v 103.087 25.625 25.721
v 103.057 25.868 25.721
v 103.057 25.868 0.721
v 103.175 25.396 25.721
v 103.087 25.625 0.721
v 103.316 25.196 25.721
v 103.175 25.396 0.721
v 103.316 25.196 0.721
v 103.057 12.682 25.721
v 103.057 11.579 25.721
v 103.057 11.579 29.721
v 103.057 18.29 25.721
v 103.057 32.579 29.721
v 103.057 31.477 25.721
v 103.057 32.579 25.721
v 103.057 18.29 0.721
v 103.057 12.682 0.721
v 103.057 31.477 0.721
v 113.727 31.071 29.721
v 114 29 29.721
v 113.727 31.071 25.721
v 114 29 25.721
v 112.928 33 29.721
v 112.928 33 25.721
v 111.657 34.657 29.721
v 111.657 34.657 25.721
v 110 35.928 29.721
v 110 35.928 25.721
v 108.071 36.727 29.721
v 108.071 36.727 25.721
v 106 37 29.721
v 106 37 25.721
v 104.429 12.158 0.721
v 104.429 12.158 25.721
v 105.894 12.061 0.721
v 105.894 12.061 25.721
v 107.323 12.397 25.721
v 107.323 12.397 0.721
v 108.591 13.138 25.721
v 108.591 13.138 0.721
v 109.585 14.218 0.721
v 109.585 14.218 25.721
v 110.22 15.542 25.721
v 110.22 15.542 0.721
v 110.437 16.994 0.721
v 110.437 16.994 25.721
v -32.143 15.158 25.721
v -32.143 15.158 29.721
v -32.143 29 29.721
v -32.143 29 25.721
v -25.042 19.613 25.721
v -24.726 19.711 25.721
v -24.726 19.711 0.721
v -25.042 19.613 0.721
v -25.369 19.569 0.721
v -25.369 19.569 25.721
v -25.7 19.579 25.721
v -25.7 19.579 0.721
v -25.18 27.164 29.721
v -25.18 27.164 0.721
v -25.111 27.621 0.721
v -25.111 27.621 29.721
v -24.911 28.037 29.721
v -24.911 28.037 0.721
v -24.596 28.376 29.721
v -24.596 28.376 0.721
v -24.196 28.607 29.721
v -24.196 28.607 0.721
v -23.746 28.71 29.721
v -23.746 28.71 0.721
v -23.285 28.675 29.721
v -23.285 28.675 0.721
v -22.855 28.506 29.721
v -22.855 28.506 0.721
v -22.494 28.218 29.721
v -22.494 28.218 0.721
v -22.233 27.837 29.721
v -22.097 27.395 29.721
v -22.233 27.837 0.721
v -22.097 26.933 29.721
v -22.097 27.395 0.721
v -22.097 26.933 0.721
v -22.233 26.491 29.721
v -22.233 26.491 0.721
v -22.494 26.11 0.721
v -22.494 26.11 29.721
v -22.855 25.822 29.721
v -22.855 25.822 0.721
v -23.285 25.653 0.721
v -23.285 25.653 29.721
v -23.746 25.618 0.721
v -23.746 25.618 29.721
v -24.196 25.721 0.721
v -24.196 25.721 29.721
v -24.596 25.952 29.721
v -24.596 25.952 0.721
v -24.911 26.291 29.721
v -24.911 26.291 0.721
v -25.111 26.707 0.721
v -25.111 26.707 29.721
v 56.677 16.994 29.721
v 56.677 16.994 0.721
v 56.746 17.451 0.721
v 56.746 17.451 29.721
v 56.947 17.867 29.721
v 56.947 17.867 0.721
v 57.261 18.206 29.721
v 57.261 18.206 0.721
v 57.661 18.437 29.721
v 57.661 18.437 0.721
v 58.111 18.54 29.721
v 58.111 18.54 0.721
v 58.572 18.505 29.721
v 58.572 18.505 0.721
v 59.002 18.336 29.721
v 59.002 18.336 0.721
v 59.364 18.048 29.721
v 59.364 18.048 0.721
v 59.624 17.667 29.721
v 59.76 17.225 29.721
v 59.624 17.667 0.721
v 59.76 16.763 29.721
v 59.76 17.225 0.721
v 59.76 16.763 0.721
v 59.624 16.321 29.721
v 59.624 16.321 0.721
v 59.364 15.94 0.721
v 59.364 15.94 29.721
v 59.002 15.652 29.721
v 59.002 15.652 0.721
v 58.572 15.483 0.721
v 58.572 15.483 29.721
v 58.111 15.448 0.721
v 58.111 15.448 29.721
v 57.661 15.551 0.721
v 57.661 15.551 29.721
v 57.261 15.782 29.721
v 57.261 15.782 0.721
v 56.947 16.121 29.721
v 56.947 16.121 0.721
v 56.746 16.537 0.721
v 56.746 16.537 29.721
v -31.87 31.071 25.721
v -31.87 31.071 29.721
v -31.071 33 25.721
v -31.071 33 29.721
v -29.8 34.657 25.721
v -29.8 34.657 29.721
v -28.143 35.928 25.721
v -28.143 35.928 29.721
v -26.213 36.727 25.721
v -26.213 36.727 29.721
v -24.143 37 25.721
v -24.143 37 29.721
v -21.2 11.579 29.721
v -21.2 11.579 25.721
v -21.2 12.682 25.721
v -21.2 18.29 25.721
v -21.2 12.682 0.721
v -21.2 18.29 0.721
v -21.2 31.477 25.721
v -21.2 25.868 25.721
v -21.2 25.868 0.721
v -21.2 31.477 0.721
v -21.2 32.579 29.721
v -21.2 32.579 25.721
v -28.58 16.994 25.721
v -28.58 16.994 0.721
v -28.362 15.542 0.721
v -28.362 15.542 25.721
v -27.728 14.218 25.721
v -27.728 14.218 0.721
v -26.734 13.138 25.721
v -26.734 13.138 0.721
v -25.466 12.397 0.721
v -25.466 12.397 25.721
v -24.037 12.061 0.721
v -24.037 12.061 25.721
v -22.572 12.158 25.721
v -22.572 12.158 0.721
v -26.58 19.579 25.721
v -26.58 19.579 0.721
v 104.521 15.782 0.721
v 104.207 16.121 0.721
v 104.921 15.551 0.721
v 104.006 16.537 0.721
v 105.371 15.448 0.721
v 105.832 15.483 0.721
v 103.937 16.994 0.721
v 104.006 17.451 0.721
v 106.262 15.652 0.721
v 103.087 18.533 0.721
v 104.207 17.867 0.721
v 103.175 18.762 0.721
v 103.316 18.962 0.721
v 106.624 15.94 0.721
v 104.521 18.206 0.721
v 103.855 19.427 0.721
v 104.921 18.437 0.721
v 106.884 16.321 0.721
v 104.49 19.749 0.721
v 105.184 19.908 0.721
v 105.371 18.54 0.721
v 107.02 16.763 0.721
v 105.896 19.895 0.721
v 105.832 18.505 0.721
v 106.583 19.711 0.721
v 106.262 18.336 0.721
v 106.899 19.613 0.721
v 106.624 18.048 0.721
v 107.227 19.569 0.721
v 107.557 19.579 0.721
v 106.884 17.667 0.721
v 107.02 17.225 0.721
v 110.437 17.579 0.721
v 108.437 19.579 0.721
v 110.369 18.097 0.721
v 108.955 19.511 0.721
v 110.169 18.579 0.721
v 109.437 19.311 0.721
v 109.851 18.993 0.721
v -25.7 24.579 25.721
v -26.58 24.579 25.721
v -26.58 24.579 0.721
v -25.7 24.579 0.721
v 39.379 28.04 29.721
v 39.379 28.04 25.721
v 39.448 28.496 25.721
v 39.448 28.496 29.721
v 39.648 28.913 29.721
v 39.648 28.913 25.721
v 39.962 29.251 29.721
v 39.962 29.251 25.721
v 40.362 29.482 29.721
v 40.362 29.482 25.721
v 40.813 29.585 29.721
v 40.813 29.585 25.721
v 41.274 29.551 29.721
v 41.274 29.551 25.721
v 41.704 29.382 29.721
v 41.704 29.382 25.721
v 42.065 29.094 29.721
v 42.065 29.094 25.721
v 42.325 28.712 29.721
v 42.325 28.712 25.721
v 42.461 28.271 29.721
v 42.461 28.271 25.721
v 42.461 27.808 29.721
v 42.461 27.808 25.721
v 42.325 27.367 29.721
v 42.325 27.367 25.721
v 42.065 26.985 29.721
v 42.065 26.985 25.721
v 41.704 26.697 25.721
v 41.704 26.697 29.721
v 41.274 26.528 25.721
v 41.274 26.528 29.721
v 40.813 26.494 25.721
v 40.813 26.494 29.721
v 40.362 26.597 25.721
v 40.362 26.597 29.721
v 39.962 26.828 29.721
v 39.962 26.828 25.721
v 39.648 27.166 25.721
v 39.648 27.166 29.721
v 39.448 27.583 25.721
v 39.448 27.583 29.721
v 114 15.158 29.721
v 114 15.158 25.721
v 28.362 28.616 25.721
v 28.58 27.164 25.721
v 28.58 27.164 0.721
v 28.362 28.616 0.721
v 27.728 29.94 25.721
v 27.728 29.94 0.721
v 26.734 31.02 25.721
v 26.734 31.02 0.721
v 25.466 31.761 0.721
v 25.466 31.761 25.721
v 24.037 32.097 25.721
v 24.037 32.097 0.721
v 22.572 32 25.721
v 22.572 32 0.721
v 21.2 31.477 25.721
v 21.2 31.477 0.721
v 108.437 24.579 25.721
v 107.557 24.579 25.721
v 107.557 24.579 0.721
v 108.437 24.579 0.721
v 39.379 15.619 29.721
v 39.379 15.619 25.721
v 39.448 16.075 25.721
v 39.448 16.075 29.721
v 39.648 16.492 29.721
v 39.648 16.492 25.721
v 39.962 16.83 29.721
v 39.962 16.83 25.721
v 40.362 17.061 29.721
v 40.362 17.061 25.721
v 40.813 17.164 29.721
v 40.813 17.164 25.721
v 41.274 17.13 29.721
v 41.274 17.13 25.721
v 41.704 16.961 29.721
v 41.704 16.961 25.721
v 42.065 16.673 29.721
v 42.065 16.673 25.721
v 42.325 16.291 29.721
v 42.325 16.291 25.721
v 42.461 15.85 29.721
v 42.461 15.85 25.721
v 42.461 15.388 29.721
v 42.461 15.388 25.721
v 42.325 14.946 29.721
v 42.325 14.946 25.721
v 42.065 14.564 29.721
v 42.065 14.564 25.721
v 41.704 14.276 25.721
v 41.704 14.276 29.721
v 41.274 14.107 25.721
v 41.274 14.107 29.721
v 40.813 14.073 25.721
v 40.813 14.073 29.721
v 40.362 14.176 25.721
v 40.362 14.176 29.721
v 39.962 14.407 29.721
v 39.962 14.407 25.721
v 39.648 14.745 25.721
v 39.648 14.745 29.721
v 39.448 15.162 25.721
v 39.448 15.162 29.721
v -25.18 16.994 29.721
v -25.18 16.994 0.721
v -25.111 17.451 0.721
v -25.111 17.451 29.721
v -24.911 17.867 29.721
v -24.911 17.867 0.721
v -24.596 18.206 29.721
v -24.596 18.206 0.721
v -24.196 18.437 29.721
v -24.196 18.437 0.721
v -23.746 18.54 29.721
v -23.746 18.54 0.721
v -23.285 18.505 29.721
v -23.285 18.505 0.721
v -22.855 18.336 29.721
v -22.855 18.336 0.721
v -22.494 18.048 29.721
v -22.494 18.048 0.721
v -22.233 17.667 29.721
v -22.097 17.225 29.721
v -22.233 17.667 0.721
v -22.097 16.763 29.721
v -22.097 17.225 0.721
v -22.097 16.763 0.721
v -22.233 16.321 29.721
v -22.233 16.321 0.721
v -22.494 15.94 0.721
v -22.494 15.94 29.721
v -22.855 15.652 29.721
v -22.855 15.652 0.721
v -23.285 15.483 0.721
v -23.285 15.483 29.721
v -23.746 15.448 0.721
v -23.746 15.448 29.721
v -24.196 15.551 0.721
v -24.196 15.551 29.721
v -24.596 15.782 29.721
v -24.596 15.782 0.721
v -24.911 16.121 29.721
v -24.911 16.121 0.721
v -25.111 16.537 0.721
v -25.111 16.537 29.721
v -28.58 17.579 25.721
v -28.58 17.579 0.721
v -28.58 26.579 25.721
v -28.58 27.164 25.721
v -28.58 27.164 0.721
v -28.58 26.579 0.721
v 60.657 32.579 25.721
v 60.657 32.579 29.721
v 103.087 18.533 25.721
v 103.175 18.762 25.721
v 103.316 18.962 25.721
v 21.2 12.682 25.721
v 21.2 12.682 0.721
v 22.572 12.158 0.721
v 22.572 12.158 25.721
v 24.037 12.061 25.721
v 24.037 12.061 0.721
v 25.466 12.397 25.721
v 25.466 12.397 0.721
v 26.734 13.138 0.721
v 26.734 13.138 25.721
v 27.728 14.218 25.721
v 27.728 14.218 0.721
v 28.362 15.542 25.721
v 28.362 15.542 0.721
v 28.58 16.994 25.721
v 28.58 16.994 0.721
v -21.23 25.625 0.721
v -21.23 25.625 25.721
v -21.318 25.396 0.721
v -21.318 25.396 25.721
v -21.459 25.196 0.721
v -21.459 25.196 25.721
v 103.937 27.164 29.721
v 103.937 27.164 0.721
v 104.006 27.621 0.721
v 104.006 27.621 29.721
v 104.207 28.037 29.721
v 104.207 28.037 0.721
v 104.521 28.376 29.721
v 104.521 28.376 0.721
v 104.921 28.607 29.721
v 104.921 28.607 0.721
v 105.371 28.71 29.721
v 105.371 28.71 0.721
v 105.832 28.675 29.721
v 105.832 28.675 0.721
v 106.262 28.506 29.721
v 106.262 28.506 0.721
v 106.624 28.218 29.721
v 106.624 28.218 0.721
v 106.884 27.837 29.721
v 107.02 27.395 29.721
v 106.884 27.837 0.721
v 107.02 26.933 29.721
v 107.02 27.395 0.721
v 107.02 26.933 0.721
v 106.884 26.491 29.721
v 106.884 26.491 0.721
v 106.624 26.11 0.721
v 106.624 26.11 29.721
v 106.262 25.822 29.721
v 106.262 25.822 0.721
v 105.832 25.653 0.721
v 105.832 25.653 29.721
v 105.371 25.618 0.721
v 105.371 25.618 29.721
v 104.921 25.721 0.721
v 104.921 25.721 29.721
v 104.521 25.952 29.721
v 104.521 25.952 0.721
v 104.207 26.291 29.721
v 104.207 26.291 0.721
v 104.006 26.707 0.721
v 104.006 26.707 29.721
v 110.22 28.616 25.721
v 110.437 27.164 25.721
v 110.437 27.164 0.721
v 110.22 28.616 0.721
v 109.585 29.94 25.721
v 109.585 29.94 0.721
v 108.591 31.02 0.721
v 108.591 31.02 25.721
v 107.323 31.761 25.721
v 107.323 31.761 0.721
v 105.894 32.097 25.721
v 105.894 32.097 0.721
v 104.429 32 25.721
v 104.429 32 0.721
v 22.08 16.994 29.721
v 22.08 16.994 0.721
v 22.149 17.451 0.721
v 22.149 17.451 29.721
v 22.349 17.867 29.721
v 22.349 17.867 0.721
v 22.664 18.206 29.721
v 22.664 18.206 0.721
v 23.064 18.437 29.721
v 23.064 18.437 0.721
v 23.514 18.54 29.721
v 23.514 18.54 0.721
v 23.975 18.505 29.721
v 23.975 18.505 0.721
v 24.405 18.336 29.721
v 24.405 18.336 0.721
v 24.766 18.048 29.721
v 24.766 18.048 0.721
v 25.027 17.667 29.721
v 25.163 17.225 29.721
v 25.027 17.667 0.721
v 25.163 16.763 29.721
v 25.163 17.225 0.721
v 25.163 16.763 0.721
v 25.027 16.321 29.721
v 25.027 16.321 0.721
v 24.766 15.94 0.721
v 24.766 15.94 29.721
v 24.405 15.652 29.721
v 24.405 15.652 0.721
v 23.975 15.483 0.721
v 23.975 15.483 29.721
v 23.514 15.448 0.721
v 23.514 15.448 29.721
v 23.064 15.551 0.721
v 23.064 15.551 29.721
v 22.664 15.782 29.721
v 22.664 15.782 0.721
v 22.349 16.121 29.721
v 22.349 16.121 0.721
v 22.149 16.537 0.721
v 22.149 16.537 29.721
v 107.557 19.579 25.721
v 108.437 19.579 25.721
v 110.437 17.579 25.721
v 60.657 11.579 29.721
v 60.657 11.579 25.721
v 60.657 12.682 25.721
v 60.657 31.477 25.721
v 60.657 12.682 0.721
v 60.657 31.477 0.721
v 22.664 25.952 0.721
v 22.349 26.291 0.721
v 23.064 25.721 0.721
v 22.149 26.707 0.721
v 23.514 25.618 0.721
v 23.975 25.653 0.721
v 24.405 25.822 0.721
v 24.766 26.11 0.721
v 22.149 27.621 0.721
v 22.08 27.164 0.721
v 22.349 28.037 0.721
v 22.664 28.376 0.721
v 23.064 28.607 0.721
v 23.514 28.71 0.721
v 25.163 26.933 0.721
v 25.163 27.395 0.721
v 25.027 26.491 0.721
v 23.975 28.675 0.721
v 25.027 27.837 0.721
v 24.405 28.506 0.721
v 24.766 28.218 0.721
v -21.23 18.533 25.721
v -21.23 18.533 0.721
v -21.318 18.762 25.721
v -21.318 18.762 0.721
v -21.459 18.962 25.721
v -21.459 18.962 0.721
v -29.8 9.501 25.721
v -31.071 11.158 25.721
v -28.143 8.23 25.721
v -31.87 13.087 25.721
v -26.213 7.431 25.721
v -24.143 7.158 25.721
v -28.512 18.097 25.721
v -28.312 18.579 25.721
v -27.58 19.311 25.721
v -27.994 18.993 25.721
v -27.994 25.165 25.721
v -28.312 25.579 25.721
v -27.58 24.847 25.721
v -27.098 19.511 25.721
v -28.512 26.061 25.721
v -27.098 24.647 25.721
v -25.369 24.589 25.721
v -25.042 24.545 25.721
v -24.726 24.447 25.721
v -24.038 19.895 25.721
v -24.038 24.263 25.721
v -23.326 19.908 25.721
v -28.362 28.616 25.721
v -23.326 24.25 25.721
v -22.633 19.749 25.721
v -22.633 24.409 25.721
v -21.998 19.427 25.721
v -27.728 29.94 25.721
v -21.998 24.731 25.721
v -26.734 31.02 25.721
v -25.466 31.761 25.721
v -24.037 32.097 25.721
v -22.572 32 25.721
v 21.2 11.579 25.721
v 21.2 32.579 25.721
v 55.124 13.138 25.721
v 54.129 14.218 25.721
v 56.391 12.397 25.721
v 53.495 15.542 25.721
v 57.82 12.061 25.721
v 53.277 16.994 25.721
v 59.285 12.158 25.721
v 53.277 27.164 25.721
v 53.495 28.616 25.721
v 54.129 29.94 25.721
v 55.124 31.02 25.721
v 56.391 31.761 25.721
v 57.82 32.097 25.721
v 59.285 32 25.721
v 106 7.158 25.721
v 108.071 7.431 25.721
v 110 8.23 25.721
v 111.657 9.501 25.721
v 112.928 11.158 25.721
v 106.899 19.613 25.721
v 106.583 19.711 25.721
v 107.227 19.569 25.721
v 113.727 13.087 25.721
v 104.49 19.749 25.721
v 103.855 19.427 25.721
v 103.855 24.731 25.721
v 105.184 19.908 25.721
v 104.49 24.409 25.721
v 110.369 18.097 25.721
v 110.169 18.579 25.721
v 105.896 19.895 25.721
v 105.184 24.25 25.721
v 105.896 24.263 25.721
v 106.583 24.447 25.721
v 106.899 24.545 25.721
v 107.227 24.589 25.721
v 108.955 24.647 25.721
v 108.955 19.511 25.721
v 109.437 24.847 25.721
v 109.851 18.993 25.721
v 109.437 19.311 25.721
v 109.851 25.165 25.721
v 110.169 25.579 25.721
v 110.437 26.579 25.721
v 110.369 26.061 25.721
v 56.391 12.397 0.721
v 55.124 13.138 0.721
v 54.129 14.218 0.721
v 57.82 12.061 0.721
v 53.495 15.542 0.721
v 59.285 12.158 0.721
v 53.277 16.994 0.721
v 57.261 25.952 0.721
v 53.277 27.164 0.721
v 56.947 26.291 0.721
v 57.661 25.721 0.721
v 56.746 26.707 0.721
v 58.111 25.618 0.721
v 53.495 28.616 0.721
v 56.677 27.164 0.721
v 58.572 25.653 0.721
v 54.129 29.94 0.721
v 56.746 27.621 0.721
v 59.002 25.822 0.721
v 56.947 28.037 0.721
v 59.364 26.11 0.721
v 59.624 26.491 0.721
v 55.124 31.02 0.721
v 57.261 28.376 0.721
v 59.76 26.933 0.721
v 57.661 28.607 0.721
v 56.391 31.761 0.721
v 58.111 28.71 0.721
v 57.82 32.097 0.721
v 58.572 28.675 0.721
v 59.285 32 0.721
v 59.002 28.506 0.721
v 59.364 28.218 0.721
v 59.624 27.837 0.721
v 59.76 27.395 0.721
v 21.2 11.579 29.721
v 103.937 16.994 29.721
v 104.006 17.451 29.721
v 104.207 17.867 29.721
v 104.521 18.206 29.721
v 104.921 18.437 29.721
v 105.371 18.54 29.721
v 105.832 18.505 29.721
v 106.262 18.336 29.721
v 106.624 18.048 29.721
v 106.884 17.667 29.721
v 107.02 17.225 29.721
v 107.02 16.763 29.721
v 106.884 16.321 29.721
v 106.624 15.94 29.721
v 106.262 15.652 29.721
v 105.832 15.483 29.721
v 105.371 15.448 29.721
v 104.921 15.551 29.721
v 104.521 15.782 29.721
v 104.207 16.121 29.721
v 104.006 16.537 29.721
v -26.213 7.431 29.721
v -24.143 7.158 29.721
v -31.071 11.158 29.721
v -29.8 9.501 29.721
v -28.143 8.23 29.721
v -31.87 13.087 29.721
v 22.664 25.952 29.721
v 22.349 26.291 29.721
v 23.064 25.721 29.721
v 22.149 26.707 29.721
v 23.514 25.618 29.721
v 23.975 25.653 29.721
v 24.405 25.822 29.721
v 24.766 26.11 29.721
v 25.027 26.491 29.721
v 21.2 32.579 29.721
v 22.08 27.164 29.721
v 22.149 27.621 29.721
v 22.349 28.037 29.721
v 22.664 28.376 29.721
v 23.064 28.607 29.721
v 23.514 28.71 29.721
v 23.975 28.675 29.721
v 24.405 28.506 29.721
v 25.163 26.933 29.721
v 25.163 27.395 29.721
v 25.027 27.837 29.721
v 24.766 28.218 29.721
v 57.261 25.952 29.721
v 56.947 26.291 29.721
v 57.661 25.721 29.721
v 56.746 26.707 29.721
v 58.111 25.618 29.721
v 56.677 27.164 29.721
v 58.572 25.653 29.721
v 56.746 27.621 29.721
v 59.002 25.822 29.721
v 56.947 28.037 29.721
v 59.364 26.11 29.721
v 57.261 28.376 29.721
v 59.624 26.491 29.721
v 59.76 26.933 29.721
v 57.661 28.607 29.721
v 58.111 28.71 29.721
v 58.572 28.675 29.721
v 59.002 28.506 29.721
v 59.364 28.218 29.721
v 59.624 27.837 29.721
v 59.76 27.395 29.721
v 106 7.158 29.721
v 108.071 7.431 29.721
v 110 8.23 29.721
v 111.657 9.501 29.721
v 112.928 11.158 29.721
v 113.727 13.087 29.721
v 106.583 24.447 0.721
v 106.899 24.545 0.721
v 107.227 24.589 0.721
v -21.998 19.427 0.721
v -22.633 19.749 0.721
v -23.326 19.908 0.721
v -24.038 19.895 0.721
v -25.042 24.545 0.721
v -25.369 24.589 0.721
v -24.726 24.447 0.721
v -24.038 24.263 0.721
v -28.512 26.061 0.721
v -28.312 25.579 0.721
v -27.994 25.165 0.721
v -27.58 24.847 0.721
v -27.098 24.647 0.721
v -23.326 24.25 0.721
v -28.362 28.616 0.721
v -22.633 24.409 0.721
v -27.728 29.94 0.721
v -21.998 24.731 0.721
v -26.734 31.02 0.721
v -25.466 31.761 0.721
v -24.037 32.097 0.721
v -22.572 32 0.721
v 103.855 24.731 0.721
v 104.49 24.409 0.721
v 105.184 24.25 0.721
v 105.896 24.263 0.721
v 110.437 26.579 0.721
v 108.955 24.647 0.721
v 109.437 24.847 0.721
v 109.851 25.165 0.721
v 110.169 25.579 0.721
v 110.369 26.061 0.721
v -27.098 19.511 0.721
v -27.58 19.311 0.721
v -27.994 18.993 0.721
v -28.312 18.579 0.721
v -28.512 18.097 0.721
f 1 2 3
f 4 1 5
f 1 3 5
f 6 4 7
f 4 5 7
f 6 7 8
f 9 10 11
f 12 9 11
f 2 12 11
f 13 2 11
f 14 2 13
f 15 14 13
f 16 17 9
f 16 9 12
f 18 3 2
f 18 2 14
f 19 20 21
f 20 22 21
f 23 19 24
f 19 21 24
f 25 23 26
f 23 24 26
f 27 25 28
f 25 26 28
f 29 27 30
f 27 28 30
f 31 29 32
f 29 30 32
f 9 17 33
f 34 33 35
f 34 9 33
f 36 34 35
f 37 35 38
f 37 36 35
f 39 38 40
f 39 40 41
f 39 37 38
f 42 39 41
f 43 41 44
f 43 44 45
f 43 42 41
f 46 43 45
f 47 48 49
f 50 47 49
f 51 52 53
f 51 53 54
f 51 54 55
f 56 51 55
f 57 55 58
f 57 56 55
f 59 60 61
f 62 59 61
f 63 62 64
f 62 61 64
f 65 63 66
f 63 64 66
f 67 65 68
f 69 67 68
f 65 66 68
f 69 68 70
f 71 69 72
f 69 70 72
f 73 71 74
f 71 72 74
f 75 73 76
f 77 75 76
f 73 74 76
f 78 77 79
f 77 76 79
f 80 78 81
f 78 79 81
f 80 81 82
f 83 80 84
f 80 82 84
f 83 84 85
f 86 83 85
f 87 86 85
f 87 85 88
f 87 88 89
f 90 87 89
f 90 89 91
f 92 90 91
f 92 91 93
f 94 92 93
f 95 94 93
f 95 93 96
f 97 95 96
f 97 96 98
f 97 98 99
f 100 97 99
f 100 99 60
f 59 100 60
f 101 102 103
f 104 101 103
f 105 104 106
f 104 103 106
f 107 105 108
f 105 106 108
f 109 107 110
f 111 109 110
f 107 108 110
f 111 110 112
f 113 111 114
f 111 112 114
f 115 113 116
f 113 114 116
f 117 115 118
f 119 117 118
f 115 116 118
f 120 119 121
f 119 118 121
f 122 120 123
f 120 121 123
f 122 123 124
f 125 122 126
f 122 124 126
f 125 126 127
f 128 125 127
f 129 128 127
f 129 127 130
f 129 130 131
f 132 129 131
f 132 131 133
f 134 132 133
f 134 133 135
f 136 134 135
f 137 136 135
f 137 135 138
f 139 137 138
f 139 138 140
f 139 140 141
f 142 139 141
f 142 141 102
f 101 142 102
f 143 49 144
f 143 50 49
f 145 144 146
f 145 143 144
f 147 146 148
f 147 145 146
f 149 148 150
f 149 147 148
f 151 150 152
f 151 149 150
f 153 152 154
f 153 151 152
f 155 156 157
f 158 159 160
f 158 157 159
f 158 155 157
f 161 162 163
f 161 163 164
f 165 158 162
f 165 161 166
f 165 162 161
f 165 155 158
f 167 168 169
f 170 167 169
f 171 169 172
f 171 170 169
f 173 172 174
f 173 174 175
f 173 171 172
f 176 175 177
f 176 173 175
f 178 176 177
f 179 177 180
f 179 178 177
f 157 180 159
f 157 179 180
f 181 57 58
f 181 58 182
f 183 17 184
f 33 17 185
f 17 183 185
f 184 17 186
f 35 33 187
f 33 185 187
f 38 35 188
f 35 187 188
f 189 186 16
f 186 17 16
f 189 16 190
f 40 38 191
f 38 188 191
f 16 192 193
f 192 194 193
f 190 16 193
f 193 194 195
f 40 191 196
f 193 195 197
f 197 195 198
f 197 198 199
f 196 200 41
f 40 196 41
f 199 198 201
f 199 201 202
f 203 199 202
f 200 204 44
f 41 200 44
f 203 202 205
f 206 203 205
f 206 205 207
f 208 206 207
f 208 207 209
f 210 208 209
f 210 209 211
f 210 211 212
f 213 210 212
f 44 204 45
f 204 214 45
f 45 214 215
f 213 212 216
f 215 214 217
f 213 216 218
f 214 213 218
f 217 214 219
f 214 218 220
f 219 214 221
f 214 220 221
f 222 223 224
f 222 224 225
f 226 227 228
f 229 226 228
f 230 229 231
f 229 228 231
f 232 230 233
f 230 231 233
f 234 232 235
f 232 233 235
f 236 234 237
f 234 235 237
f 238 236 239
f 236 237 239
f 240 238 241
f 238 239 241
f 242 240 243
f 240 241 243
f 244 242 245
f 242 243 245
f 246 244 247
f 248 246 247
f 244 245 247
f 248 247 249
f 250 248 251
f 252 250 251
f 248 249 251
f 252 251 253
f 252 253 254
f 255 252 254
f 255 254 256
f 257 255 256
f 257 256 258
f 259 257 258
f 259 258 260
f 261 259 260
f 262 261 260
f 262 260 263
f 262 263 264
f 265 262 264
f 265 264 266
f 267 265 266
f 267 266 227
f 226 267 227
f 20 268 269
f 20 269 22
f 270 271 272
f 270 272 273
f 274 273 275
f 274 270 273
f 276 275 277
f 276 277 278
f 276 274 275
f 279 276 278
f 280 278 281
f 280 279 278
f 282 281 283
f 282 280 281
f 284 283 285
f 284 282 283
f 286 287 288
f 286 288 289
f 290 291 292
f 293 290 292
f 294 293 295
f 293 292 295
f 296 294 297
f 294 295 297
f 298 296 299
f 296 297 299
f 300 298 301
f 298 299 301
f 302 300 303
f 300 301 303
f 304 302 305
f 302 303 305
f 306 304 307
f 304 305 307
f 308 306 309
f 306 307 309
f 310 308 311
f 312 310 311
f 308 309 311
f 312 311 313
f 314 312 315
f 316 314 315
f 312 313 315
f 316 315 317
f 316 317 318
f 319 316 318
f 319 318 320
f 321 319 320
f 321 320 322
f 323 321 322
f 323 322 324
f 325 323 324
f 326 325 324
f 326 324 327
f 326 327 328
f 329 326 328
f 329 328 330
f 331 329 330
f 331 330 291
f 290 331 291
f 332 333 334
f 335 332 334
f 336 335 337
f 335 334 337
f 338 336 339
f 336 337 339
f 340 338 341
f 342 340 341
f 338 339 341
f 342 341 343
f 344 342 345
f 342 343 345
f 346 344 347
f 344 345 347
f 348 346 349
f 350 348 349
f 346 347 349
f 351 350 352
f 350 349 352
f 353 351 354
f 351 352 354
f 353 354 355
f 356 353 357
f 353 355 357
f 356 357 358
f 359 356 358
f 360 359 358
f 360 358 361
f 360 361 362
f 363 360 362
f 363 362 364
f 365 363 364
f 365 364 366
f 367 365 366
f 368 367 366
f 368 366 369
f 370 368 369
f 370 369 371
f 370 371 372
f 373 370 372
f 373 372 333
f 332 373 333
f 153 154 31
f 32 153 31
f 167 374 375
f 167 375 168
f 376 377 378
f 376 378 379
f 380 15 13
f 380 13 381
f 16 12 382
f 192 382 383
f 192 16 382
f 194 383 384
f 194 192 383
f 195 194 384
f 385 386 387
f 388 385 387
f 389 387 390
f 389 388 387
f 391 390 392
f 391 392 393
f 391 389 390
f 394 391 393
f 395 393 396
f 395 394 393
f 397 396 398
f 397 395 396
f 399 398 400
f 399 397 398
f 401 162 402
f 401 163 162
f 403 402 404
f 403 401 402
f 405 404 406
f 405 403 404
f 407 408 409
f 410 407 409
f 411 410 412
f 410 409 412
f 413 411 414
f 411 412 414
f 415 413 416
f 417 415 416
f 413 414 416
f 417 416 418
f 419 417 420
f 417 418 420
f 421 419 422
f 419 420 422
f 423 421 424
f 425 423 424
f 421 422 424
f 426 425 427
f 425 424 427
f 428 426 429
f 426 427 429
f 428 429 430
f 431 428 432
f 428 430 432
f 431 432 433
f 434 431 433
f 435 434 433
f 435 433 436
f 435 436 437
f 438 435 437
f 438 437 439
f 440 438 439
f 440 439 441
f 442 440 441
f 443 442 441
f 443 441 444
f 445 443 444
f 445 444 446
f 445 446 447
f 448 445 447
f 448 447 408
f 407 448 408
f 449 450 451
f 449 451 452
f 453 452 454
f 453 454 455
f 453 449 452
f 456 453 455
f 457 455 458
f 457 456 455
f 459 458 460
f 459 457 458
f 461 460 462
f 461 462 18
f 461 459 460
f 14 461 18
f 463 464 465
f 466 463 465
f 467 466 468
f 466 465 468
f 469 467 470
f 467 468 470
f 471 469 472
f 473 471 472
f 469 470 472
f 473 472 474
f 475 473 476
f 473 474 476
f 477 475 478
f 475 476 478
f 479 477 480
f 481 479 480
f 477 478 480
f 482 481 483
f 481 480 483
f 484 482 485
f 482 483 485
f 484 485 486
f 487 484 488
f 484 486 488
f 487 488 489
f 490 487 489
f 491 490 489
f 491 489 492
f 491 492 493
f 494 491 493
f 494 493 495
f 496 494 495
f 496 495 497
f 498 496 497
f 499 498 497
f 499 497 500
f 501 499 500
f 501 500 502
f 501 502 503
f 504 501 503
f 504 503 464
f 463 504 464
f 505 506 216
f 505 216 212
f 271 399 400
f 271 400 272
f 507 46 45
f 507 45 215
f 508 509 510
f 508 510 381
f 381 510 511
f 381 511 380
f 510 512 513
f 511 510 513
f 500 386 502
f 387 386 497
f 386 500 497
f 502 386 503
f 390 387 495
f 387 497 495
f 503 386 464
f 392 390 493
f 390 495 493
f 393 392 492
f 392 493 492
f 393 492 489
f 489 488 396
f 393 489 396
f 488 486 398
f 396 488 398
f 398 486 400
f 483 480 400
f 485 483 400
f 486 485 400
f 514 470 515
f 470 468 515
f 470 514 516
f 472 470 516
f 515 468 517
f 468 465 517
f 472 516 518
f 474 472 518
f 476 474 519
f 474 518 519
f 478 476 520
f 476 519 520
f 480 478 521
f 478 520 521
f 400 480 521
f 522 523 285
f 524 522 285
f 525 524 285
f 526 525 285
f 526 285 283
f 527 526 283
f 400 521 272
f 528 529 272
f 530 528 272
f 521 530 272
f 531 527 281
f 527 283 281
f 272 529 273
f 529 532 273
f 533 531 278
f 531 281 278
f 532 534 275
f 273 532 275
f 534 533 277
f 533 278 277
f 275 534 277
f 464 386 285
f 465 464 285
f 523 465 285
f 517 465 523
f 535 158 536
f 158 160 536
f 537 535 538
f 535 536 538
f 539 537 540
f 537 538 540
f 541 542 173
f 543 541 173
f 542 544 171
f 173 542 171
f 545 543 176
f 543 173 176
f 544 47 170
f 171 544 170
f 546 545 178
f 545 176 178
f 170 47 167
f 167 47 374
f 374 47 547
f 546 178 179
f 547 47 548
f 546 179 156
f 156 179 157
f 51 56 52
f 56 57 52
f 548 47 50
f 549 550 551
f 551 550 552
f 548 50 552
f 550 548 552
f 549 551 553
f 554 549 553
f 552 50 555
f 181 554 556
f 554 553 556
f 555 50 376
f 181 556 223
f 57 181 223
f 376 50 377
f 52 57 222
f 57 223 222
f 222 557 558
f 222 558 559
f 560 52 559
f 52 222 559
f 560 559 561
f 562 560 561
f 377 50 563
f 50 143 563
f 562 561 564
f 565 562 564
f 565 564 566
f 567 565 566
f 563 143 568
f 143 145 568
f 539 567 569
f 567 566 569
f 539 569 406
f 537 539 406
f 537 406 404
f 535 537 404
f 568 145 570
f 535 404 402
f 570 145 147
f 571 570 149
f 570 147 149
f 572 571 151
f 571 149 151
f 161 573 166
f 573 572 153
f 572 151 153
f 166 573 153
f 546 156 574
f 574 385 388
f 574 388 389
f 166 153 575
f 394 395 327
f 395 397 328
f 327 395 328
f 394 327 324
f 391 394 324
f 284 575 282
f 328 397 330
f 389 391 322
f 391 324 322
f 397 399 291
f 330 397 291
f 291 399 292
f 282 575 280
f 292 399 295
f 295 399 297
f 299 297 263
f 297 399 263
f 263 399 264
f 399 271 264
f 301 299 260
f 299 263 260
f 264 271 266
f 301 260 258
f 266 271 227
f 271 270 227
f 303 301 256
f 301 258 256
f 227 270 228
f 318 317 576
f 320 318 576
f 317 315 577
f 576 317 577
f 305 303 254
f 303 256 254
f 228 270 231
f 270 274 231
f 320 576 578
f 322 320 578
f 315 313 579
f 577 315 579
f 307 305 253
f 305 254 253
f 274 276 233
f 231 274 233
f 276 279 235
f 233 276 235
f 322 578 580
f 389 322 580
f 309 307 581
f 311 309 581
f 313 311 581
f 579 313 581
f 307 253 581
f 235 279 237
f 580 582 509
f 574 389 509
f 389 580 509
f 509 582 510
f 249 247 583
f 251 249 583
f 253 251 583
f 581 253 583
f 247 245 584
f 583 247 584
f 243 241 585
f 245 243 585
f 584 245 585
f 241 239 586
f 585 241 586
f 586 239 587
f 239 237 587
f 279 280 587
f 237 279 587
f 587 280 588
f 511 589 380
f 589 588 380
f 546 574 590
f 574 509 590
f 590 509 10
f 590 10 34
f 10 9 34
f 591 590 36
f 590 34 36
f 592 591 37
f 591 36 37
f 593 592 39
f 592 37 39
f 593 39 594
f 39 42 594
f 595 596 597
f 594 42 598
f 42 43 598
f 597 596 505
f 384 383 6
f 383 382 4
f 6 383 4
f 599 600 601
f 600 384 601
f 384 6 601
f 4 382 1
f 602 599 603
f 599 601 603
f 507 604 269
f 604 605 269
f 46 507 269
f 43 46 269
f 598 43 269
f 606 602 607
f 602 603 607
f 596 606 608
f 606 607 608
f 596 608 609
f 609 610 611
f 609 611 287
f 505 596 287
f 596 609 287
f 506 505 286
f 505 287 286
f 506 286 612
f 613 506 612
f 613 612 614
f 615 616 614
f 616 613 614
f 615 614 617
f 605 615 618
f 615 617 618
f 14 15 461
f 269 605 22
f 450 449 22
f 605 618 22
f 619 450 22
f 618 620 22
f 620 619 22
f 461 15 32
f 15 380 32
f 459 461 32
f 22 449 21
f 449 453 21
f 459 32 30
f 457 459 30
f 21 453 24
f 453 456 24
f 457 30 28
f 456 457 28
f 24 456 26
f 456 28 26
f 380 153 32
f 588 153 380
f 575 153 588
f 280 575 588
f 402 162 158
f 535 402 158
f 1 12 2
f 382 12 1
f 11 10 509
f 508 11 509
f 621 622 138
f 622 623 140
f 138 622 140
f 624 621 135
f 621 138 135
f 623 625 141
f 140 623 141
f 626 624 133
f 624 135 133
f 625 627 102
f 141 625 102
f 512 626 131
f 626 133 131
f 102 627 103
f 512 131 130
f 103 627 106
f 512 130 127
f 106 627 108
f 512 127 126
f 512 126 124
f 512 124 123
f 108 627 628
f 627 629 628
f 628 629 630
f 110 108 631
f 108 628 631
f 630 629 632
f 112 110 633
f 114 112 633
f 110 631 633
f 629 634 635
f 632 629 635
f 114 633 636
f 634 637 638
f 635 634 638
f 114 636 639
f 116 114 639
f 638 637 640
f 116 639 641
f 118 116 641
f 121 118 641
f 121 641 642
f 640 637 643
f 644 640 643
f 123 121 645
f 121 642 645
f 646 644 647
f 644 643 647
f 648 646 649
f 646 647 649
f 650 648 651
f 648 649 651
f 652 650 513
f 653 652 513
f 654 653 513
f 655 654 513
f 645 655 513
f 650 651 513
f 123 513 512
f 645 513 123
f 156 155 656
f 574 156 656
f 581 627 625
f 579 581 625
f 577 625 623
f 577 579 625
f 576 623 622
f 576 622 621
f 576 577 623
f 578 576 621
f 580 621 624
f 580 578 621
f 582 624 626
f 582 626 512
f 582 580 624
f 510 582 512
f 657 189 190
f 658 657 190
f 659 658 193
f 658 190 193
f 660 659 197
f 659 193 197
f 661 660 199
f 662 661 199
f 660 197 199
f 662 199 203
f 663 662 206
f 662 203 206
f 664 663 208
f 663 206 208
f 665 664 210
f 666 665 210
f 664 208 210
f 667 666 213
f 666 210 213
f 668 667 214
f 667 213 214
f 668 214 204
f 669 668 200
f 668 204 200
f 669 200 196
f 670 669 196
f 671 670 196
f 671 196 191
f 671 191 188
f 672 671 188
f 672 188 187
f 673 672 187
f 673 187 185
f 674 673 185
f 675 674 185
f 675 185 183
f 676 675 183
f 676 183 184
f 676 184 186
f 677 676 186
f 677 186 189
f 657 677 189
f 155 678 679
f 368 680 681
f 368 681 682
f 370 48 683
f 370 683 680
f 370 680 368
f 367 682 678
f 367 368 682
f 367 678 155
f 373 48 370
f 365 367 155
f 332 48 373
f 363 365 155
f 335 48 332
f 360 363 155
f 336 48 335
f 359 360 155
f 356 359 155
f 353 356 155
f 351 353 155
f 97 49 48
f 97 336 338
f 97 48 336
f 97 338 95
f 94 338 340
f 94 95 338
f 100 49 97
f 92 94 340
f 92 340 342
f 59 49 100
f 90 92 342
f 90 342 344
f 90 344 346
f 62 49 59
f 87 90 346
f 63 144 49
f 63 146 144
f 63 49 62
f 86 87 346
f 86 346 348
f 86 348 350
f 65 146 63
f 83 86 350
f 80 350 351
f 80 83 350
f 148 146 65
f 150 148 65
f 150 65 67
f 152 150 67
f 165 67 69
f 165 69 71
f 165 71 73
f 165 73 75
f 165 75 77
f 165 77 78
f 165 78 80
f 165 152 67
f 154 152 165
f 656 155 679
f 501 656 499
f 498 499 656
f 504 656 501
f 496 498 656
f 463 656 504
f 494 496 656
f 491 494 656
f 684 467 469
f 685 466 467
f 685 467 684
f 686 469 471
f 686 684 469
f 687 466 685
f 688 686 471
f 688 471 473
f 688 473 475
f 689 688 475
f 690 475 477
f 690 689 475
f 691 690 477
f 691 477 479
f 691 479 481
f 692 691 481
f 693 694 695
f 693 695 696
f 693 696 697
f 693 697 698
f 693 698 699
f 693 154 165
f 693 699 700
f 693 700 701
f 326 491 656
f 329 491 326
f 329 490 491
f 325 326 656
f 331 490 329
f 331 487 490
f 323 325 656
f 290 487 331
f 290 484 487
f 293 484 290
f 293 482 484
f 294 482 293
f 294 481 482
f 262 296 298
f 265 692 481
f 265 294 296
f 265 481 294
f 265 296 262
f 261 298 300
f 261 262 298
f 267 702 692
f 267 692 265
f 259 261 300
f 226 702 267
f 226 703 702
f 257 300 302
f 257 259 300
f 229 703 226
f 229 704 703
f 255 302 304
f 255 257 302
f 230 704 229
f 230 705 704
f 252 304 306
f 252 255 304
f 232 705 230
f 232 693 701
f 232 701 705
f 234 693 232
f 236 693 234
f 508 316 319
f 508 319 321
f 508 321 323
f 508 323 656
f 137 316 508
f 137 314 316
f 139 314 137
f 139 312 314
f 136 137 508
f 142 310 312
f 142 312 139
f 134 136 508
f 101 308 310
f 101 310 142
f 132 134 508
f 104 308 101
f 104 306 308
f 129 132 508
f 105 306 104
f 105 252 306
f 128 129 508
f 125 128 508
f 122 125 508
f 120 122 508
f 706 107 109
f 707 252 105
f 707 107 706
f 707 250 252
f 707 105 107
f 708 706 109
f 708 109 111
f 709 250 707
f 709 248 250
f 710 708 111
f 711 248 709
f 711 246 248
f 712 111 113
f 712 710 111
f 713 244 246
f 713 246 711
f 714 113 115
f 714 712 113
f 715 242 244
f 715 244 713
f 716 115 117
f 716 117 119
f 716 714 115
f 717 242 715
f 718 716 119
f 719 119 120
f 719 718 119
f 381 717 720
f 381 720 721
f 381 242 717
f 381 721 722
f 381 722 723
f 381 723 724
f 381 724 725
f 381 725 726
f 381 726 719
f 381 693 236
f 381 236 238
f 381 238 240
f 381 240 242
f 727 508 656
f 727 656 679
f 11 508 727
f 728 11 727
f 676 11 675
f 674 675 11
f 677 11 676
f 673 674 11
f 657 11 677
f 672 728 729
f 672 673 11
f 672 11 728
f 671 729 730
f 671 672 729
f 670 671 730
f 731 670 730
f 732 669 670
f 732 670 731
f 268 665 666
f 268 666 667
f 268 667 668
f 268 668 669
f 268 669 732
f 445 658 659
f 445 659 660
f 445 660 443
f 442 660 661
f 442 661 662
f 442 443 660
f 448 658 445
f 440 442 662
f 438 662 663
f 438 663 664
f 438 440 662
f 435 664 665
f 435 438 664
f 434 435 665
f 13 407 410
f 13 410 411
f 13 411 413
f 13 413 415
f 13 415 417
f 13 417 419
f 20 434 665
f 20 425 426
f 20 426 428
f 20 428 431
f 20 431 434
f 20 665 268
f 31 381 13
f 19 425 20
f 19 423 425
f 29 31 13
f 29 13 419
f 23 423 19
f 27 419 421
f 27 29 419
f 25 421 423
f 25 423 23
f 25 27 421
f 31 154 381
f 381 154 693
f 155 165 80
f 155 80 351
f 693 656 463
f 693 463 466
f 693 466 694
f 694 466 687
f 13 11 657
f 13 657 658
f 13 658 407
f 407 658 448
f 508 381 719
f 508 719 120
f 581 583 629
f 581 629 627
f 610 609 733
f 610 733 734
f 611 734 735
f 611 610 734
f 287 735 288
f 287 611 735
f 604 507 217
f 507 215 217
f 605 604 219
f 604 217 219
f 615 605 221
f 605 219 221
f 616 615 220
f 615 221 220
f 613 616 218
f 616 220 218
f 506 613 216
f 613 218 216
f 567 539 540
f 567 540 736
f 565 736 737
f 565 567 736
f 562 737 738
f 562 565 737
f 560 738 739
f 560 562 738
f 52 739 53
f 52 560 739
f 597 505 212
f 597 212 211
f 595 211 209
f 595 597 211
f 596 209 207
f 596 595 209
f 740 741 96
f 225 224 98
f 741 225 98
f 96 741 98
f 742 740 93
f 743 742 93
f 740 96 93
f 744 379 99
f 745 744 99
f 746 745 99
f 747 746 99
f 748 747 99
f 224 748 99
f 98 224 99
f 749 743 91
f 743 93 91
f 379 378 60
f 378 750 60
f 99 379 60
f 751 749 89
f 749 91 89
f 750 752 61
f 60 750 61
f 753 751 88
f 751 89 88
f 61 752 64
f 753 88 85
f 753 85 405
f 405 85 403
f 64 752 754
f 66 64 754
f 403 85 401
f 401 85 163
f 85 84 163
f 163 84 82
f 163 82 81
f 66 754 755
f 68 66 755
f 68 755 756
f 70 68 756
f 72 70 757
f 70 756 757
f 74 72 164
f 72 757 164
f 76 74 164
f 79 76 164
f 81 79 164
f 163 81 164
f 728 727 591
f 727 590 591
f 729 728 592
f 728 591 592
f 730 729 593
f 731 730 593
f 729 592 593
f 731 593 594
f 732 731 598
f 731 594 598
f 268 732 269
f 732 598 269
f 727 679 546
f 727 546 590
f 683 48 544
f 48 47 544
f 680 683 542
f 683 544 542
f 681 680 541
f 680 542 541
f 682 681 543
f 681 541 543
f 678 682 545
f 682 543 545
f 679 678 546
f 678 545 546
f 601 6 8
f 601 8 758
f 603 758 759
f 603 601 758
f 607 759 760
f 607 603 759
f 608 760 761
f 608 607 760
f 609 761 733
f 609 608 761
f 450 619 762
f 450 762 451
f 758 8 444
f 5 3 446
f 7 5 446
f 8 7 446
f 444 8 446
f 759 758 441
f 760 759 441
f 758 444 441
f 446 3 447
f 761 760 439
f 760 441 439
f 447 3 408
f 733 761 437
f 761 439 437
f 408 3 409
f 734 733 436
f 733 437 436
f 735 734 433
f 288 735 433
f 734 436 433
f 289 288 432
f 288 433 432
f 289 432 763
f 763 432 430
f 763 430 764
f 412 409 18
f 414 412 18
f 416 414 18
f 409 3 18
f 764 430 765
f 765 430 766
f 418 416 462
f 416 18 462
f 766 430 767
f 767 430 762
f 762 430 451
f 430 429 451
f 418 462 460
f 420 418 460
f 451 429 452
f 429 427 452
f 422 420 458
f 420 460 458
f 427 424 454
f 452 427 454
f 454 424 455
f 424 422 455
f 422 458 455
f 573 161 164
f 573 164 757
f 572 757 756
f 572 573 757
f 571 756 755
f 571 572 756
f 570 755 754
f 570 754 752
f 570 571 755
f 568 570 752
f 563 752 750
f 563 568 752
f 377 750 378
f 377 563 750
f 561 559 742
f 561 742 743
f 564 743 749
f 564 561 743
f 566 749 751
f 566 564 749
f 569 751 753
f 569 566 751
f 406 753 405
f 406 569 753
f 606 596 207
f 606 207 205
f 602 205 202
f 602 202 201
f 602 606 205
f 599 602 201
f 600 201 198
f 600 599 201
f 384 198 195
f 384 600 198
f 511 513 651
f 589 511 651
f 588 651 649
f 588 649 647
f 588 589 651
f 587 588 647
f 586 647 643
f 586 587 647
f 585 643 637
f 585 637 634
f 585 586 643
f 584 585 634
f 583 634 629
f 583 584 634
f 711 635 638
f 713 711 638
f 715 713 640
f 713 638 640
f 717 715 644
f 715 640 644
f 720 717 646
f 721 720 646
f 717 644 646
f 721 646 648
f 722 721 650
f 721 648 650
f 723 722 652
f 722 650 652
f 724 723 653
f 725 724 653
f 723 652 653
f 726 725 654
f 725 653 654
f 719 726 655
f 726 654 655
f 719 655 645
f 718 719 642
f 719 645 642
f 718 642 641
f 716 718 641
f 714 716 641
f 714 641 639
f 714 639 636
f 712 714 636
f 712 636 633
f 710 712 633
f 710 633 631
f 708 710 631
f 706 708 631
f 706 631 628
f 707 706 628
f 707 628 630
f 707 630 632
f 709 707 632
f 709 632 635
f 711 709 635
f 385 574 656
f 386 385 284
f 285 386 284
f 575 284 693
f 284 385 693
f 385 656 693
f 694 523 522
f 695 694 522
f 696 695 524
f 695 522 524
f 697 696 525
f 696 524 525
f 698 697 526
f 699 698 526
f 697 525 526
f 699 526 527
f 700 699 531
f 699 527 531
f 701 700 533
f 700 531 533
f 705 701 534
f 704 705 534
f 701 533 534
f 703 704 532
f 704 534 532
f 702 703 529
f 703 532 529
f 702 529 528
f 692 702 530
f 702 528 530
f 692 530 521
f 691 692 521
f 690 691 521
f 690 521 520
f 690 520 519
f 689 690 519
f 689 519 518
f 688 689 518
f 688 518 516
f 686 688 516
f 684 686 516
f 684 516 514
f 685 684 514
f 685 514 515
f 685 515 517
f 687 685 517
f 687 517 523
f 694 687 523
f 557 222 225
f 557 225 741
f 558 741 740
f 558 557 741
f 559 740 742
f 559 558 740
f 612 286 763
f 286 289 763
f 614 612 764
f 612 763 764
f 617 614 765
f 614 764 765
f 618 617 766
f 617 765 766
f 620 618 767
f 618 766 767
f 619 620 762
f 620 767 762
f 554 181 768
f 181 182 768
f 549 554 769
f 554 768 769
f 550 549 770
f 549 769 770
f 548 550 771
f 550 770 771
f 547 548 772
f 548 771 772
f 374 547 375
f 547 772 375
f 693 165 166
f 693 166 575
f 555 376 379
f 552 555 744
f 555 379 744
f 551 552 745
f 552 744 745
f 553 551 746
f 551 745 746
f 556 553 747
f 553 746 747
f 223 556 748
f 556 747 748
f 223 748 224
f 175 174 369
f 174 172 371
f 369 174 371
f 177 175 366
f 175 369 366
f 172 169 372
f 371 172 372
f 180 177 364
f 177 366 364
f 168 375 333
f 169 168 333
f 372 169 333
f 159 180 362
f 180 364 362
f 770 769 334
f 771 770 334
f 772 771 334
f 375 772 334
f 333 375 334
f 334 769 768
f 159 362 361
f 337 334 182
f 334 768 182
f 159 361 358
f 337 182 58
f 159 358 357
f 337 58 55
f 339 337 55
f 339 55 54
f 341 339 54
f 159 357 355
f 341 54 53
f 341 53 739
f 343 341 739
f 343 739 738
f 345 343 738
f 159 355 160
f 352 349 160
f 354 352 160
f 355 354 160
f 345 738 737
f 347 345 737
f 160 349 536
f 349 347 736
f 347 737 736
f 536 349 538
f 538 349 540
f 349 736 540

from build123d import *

# Parameters (mm, degrees)
SKETCH1_W                      = 146.142719433
SKETCH1_H                      = 29.841975708
BOSS_EXTRUDE1_DEPTH            = 4
SKETCH2_W                      = 42.4
SKETCH2_H                      = 21
CUT_EXTRUDE1_DEPTH             = 120.920808812
SKETCH3_W                      = 42.4
SKETCH3_H                      = 21
CUT_EXTRUDE2_DEPTH             = 120.920808812
BOSS_EXTRUDE2_DEPTH            = 25
BOSS_EXTRUDE3_DEPTH            = 25
BOSS_EXTRUDE4_DEPTH            = 25
BOSS_EXTRUDE5_DEPTH            = 25
BOSS_EXTRUDE6_DEPTH            = 25
BOSS_EXTRUDE7_DEPTH            = 25
F_3_1_3_1_DIAMETER_HOLE1_D     = 3.1
F_3_1_3_1_DIAMETER_HOLE1_DEPTH = 29
F_3_1_3_1_DIAMETER_HOLE2_D     = 3.1
FILLET1_R                      = 1
FILLET2_R                      = 2
FILLET3_R                      = 8


with BuildPart() as part:
    # Sketch1 → Boss-Extrude1 (new body)
    with BuildSketch(Plane.XY.offset(29.720987506)):
        with Locations((40.928641953, 22.079012221)):
            Rectangle(SKETCH1_W, SKETCH1_H)
    extrude(amount=-BOSS_EXTRUDE1_DEPTH)

    # Sketch2 → Cut-Extrude1 (cut, through all)
    with BuildSketch(Plane.XY.offset(29.720987506)):
        with Locations((0, 22.079011948)):
            Rectangle(SKETCH2_W, SKETCH2_H)
    extrude(amount=-CUT_EXTRUDE1_DEPTH, mode=Mode.SUBTRACT)

    # Sketch3 → Cut-Extrude2 (cut, through all)
    with BuildSketch(Plane(origin=(0, 0, 25.720987506), x_dir=(-1, 0, 0), z_dir=(0, 0, -1))):
        with Locations((-81.857283905, 22.079012494)):
            Rectangle(SKETCH3_W, SKETCH3_H)
    extrude(amount=-CUT_EXTRUDE2_DEPTH, mode=Mode.SUBTRACT)

    # Sketch4 → Boss-Extrude2 (add)
    with BuildSketch(Plane(origin=(0, 0, 25.720987506), x_dir=(-1, 0, 0), z_dir=(0, 0, -1))):
        with BuildLine():
            Line((28.579999925, 27.164011892), (28.579999925, 24.579012633))
            Line((28.579999925, 24.579012633), (25.700002555, 24.579012633))
            ThreePointArc((25.700002555, 24.579012633), (25.204684679, 24.573625897), (24.72588263, 24.446671519))
            ThreePointArc((24.72588263, 24.446671519), (22.771679916, 24.362550773), (21.2, 25.52694194))
            Line((21.2, 25.52694194), (21.2, 31.476505426))
            ThreePointArc((21.2, 31.476505426), (26.12739861, 31.437827499), (28.579999925, 27.164011892))
        make_face()
    extrude(amount=BOSS_EXTRUDE2_DEPTH)

    # Sketch5 → Boss-Extrude3 (add)
    with BuildSketch(Plane(origin=(0, 0, 25.720987506), x_dir=(-1, 0, 0), z_dir=(0, 0, -1))):
        with BuildLine():
            Line((25.700002576, 19.579012066), (28.580000075, 19.579012066))
            Line((28.580000075, 19.579012066), (28.580000075, 16.994011892))
            ThreePointArc((28.580000075, 16.994011892), (26.127398683, 12.720196248), (21.2, 12.68151847))
            Line((21.2, 12.68151847), (21.2, 18.631083048))
            ThreePointArc((21.2, 18.631083048), (22.771680162, 19.795473883), (24.725882875, 19.711353108))
            ThreePointArc((24.725882875, 19.711353108), (25.204684818, 19.58439879), (25.700002576, 19.579012066))
        make_face()
    extrude(amount=BOSS_EXTRUDE3_DEPTH)

    # Sketch6 → Boss-Extrude4 (add)
    with BuildSketch(Plane(origin=(0, 0, 25.720987506), x_dir=(-1, 0, 0), z_dir=(0, 0, -1))):
        with BuildLine():
            Line((-107.557286435, 24.579012773), (-110.437283905, 24.579012773))
            Line((-110.437283905, 24.579012773), (-110.437283905, 27.164012494))
            ThreePointArc((-110.437283905, 27.164012494), (-107.984682551, 31.43782812), (-103.057283905, 31.476505972))
            Line((-103.057283905, 31.476505972), (-103.057283905, 25.52694194))
            ThreePointArc((-103.057283905, 25.52694194), (-104.628963944, 24.362550939), (-106.583166657, 24.4466717))
            ThreePointArc((-106.583166657, 24.4466717), (-107.061968635, 24.573626043), (-107.557286435, 24.579012773))
        make_face()
    extrude(amount=BOSS_EXTRUDE4_DEPTH)

    # Sketch7 → Boss-Extrude5 (add)
    with BuildSketch(Plane(origin=(0, 0, 25.720987506), x_dir=(-1, 0, 0), z_dir=(0, 0, -1))):
        with BuildLine():
            Line((-110.437283905, 16.994012494), (-110.437283905, 19.579012206))
            Line((-110.437283905, 19.579012206), (-107.557286506, 19.579012206))
            ThreePointArc((-107.557286506, 19.579012206), (-107.06196867, 19.584398936), (-106.583166657, 19.711353289))
            ThreePointArc((-106.583166657, 19.711353289), (-104.628963944, 19.795474049), (-103.057283905, 18.631083048))
            Line((-103.057283905, 18.631083048), (-103.057283905, 12.681519016))
            ThreePointArc((-103.057283905, 12.681519016), (-107.984682551, 12.720196869), (-110.437283905, 16.994012494))
        make_face()
    extrude(amount=BOSS_EXTRUDE5_DEPTH)

    # Sketch8 → Boss-Extrude6 (add)
    with BuildSketch(Plane(origin=(0, 0, 25.720987506), x_dir=(-1, 0, 0), z_dir=(0, 0, -1))):
        with BuildLine():
            Line((-28.58, 16.994011948), (-28.58, 27.164011948))
            ThreePointArc((-28.58, 27.164011948), (-26.127398647, 31.437827573), (-21.2, 31.476505426))
            Line((-21.2, 31.476505426), (-21.2, 12.68151847))
            ThreePointArc((-21.2, 12.68151847), (-26.127398647, 12.720196322), (-28.58, 16.994011948))
        make_face()
    extrude(amount=BOSS_EXTRUDE6_DEPTH)

    # Sketch9 → Boss-Extrude7 (add)
    with BuildSketch(Plane(origin=(0, 0, 25.720987506), x_dir=(-1, 0, 0), z_dir=(0, 0, -1))):
        with BuildLine():
            Line((-53.277283905, 27.164012494), (-53.277283905, 16.994012494))
            ThreePointArc((-53.277283905, 16.994012494), (-55.729885258, 12.720196869), (-60.657283905, 12.681519016))
            Line((-60.657283905, 12.681519016), (-60.657283905, 31.476505972))
            ThreePointArc((-60.657283905, 31.476505972), (-55.729885258, 31.43782812), (-53.277283905, 27.164012494))
        make_face()
    extrude(amount=BOSS_EXTRUDE7_DEPTH)

    # Ø3.1 (3.1) Diameter Hole1
    with Locations(Plane.XY.offset(29.720987506)):
        with Locations((40.928641952, 15.618518294), (40.928641952, 28.039506364)):
            Hole(F_3_1_3_1_DIAMETER_HOLE1_D / 2, depth=F_3_1_3_1_DIAMETER_HOLE1_DEPTH)

    # Ø3.1 (3.1) Diameter Hole2 (through all)
    with Locations(Plane.XY.offset(29.720987506)):
        with Locations((-23.63, 27.164011948), (-23.63, 16.994011948), (23.63, 16.994011948), (23.63, 27.164011948), (58.227283905, 16.994012494), (58.227283905, 27.164012494), (105.487283905, 16.994012494), (105.487283905, 27.164012494)):
            Hole(F_3_1_3_1_DIAMETER_HOLE2_D / 2)

    # Fillet1
    fillet1_edges = [part.edges().sort_by_distance(p)[0] for p in [
        (103.057283905, 18.631083048, 13.220987506),
        (-21.2, 25.52694194, 13.220987506),
        (-21.2, 18.631083048, 13.220987506),
        (103.057283905, 25.52694194, 13.220987506),
    ]]
    fillet(fillet1_edges, radius=FILLET1_R)

    # Fillet2
    fillet2_edges = [part.edges().sort_by_distance(p)[0] for p in [
        (110.437283905, 19.579012206, 13.220987506),
        (-28.579999925, 24.579012633, 13.220987506),
        (-28.580000075, 19.579012066, 13.220987506),
        (110.437283905, 24.579012773, 13.220987506),
    ]]
    fillet(fillet2_edges, radius=FILLET2_R)

    # Fillet3
    fillet3_edges = [part.edges().sort_by_distance(p)[0] for p in [
        (-32.142717764, 7.158024367, 27.720987506),
        (-32.142717764, 37.000000075, 27.720987506),
        (114.000001669, 37.000000075, 27.720987506),
        (114.000001669, 7.158024367, 27.720987506),
    ]]
    fillet(fillet3_edges, radius=FILLET3_R)


solid = part.part
